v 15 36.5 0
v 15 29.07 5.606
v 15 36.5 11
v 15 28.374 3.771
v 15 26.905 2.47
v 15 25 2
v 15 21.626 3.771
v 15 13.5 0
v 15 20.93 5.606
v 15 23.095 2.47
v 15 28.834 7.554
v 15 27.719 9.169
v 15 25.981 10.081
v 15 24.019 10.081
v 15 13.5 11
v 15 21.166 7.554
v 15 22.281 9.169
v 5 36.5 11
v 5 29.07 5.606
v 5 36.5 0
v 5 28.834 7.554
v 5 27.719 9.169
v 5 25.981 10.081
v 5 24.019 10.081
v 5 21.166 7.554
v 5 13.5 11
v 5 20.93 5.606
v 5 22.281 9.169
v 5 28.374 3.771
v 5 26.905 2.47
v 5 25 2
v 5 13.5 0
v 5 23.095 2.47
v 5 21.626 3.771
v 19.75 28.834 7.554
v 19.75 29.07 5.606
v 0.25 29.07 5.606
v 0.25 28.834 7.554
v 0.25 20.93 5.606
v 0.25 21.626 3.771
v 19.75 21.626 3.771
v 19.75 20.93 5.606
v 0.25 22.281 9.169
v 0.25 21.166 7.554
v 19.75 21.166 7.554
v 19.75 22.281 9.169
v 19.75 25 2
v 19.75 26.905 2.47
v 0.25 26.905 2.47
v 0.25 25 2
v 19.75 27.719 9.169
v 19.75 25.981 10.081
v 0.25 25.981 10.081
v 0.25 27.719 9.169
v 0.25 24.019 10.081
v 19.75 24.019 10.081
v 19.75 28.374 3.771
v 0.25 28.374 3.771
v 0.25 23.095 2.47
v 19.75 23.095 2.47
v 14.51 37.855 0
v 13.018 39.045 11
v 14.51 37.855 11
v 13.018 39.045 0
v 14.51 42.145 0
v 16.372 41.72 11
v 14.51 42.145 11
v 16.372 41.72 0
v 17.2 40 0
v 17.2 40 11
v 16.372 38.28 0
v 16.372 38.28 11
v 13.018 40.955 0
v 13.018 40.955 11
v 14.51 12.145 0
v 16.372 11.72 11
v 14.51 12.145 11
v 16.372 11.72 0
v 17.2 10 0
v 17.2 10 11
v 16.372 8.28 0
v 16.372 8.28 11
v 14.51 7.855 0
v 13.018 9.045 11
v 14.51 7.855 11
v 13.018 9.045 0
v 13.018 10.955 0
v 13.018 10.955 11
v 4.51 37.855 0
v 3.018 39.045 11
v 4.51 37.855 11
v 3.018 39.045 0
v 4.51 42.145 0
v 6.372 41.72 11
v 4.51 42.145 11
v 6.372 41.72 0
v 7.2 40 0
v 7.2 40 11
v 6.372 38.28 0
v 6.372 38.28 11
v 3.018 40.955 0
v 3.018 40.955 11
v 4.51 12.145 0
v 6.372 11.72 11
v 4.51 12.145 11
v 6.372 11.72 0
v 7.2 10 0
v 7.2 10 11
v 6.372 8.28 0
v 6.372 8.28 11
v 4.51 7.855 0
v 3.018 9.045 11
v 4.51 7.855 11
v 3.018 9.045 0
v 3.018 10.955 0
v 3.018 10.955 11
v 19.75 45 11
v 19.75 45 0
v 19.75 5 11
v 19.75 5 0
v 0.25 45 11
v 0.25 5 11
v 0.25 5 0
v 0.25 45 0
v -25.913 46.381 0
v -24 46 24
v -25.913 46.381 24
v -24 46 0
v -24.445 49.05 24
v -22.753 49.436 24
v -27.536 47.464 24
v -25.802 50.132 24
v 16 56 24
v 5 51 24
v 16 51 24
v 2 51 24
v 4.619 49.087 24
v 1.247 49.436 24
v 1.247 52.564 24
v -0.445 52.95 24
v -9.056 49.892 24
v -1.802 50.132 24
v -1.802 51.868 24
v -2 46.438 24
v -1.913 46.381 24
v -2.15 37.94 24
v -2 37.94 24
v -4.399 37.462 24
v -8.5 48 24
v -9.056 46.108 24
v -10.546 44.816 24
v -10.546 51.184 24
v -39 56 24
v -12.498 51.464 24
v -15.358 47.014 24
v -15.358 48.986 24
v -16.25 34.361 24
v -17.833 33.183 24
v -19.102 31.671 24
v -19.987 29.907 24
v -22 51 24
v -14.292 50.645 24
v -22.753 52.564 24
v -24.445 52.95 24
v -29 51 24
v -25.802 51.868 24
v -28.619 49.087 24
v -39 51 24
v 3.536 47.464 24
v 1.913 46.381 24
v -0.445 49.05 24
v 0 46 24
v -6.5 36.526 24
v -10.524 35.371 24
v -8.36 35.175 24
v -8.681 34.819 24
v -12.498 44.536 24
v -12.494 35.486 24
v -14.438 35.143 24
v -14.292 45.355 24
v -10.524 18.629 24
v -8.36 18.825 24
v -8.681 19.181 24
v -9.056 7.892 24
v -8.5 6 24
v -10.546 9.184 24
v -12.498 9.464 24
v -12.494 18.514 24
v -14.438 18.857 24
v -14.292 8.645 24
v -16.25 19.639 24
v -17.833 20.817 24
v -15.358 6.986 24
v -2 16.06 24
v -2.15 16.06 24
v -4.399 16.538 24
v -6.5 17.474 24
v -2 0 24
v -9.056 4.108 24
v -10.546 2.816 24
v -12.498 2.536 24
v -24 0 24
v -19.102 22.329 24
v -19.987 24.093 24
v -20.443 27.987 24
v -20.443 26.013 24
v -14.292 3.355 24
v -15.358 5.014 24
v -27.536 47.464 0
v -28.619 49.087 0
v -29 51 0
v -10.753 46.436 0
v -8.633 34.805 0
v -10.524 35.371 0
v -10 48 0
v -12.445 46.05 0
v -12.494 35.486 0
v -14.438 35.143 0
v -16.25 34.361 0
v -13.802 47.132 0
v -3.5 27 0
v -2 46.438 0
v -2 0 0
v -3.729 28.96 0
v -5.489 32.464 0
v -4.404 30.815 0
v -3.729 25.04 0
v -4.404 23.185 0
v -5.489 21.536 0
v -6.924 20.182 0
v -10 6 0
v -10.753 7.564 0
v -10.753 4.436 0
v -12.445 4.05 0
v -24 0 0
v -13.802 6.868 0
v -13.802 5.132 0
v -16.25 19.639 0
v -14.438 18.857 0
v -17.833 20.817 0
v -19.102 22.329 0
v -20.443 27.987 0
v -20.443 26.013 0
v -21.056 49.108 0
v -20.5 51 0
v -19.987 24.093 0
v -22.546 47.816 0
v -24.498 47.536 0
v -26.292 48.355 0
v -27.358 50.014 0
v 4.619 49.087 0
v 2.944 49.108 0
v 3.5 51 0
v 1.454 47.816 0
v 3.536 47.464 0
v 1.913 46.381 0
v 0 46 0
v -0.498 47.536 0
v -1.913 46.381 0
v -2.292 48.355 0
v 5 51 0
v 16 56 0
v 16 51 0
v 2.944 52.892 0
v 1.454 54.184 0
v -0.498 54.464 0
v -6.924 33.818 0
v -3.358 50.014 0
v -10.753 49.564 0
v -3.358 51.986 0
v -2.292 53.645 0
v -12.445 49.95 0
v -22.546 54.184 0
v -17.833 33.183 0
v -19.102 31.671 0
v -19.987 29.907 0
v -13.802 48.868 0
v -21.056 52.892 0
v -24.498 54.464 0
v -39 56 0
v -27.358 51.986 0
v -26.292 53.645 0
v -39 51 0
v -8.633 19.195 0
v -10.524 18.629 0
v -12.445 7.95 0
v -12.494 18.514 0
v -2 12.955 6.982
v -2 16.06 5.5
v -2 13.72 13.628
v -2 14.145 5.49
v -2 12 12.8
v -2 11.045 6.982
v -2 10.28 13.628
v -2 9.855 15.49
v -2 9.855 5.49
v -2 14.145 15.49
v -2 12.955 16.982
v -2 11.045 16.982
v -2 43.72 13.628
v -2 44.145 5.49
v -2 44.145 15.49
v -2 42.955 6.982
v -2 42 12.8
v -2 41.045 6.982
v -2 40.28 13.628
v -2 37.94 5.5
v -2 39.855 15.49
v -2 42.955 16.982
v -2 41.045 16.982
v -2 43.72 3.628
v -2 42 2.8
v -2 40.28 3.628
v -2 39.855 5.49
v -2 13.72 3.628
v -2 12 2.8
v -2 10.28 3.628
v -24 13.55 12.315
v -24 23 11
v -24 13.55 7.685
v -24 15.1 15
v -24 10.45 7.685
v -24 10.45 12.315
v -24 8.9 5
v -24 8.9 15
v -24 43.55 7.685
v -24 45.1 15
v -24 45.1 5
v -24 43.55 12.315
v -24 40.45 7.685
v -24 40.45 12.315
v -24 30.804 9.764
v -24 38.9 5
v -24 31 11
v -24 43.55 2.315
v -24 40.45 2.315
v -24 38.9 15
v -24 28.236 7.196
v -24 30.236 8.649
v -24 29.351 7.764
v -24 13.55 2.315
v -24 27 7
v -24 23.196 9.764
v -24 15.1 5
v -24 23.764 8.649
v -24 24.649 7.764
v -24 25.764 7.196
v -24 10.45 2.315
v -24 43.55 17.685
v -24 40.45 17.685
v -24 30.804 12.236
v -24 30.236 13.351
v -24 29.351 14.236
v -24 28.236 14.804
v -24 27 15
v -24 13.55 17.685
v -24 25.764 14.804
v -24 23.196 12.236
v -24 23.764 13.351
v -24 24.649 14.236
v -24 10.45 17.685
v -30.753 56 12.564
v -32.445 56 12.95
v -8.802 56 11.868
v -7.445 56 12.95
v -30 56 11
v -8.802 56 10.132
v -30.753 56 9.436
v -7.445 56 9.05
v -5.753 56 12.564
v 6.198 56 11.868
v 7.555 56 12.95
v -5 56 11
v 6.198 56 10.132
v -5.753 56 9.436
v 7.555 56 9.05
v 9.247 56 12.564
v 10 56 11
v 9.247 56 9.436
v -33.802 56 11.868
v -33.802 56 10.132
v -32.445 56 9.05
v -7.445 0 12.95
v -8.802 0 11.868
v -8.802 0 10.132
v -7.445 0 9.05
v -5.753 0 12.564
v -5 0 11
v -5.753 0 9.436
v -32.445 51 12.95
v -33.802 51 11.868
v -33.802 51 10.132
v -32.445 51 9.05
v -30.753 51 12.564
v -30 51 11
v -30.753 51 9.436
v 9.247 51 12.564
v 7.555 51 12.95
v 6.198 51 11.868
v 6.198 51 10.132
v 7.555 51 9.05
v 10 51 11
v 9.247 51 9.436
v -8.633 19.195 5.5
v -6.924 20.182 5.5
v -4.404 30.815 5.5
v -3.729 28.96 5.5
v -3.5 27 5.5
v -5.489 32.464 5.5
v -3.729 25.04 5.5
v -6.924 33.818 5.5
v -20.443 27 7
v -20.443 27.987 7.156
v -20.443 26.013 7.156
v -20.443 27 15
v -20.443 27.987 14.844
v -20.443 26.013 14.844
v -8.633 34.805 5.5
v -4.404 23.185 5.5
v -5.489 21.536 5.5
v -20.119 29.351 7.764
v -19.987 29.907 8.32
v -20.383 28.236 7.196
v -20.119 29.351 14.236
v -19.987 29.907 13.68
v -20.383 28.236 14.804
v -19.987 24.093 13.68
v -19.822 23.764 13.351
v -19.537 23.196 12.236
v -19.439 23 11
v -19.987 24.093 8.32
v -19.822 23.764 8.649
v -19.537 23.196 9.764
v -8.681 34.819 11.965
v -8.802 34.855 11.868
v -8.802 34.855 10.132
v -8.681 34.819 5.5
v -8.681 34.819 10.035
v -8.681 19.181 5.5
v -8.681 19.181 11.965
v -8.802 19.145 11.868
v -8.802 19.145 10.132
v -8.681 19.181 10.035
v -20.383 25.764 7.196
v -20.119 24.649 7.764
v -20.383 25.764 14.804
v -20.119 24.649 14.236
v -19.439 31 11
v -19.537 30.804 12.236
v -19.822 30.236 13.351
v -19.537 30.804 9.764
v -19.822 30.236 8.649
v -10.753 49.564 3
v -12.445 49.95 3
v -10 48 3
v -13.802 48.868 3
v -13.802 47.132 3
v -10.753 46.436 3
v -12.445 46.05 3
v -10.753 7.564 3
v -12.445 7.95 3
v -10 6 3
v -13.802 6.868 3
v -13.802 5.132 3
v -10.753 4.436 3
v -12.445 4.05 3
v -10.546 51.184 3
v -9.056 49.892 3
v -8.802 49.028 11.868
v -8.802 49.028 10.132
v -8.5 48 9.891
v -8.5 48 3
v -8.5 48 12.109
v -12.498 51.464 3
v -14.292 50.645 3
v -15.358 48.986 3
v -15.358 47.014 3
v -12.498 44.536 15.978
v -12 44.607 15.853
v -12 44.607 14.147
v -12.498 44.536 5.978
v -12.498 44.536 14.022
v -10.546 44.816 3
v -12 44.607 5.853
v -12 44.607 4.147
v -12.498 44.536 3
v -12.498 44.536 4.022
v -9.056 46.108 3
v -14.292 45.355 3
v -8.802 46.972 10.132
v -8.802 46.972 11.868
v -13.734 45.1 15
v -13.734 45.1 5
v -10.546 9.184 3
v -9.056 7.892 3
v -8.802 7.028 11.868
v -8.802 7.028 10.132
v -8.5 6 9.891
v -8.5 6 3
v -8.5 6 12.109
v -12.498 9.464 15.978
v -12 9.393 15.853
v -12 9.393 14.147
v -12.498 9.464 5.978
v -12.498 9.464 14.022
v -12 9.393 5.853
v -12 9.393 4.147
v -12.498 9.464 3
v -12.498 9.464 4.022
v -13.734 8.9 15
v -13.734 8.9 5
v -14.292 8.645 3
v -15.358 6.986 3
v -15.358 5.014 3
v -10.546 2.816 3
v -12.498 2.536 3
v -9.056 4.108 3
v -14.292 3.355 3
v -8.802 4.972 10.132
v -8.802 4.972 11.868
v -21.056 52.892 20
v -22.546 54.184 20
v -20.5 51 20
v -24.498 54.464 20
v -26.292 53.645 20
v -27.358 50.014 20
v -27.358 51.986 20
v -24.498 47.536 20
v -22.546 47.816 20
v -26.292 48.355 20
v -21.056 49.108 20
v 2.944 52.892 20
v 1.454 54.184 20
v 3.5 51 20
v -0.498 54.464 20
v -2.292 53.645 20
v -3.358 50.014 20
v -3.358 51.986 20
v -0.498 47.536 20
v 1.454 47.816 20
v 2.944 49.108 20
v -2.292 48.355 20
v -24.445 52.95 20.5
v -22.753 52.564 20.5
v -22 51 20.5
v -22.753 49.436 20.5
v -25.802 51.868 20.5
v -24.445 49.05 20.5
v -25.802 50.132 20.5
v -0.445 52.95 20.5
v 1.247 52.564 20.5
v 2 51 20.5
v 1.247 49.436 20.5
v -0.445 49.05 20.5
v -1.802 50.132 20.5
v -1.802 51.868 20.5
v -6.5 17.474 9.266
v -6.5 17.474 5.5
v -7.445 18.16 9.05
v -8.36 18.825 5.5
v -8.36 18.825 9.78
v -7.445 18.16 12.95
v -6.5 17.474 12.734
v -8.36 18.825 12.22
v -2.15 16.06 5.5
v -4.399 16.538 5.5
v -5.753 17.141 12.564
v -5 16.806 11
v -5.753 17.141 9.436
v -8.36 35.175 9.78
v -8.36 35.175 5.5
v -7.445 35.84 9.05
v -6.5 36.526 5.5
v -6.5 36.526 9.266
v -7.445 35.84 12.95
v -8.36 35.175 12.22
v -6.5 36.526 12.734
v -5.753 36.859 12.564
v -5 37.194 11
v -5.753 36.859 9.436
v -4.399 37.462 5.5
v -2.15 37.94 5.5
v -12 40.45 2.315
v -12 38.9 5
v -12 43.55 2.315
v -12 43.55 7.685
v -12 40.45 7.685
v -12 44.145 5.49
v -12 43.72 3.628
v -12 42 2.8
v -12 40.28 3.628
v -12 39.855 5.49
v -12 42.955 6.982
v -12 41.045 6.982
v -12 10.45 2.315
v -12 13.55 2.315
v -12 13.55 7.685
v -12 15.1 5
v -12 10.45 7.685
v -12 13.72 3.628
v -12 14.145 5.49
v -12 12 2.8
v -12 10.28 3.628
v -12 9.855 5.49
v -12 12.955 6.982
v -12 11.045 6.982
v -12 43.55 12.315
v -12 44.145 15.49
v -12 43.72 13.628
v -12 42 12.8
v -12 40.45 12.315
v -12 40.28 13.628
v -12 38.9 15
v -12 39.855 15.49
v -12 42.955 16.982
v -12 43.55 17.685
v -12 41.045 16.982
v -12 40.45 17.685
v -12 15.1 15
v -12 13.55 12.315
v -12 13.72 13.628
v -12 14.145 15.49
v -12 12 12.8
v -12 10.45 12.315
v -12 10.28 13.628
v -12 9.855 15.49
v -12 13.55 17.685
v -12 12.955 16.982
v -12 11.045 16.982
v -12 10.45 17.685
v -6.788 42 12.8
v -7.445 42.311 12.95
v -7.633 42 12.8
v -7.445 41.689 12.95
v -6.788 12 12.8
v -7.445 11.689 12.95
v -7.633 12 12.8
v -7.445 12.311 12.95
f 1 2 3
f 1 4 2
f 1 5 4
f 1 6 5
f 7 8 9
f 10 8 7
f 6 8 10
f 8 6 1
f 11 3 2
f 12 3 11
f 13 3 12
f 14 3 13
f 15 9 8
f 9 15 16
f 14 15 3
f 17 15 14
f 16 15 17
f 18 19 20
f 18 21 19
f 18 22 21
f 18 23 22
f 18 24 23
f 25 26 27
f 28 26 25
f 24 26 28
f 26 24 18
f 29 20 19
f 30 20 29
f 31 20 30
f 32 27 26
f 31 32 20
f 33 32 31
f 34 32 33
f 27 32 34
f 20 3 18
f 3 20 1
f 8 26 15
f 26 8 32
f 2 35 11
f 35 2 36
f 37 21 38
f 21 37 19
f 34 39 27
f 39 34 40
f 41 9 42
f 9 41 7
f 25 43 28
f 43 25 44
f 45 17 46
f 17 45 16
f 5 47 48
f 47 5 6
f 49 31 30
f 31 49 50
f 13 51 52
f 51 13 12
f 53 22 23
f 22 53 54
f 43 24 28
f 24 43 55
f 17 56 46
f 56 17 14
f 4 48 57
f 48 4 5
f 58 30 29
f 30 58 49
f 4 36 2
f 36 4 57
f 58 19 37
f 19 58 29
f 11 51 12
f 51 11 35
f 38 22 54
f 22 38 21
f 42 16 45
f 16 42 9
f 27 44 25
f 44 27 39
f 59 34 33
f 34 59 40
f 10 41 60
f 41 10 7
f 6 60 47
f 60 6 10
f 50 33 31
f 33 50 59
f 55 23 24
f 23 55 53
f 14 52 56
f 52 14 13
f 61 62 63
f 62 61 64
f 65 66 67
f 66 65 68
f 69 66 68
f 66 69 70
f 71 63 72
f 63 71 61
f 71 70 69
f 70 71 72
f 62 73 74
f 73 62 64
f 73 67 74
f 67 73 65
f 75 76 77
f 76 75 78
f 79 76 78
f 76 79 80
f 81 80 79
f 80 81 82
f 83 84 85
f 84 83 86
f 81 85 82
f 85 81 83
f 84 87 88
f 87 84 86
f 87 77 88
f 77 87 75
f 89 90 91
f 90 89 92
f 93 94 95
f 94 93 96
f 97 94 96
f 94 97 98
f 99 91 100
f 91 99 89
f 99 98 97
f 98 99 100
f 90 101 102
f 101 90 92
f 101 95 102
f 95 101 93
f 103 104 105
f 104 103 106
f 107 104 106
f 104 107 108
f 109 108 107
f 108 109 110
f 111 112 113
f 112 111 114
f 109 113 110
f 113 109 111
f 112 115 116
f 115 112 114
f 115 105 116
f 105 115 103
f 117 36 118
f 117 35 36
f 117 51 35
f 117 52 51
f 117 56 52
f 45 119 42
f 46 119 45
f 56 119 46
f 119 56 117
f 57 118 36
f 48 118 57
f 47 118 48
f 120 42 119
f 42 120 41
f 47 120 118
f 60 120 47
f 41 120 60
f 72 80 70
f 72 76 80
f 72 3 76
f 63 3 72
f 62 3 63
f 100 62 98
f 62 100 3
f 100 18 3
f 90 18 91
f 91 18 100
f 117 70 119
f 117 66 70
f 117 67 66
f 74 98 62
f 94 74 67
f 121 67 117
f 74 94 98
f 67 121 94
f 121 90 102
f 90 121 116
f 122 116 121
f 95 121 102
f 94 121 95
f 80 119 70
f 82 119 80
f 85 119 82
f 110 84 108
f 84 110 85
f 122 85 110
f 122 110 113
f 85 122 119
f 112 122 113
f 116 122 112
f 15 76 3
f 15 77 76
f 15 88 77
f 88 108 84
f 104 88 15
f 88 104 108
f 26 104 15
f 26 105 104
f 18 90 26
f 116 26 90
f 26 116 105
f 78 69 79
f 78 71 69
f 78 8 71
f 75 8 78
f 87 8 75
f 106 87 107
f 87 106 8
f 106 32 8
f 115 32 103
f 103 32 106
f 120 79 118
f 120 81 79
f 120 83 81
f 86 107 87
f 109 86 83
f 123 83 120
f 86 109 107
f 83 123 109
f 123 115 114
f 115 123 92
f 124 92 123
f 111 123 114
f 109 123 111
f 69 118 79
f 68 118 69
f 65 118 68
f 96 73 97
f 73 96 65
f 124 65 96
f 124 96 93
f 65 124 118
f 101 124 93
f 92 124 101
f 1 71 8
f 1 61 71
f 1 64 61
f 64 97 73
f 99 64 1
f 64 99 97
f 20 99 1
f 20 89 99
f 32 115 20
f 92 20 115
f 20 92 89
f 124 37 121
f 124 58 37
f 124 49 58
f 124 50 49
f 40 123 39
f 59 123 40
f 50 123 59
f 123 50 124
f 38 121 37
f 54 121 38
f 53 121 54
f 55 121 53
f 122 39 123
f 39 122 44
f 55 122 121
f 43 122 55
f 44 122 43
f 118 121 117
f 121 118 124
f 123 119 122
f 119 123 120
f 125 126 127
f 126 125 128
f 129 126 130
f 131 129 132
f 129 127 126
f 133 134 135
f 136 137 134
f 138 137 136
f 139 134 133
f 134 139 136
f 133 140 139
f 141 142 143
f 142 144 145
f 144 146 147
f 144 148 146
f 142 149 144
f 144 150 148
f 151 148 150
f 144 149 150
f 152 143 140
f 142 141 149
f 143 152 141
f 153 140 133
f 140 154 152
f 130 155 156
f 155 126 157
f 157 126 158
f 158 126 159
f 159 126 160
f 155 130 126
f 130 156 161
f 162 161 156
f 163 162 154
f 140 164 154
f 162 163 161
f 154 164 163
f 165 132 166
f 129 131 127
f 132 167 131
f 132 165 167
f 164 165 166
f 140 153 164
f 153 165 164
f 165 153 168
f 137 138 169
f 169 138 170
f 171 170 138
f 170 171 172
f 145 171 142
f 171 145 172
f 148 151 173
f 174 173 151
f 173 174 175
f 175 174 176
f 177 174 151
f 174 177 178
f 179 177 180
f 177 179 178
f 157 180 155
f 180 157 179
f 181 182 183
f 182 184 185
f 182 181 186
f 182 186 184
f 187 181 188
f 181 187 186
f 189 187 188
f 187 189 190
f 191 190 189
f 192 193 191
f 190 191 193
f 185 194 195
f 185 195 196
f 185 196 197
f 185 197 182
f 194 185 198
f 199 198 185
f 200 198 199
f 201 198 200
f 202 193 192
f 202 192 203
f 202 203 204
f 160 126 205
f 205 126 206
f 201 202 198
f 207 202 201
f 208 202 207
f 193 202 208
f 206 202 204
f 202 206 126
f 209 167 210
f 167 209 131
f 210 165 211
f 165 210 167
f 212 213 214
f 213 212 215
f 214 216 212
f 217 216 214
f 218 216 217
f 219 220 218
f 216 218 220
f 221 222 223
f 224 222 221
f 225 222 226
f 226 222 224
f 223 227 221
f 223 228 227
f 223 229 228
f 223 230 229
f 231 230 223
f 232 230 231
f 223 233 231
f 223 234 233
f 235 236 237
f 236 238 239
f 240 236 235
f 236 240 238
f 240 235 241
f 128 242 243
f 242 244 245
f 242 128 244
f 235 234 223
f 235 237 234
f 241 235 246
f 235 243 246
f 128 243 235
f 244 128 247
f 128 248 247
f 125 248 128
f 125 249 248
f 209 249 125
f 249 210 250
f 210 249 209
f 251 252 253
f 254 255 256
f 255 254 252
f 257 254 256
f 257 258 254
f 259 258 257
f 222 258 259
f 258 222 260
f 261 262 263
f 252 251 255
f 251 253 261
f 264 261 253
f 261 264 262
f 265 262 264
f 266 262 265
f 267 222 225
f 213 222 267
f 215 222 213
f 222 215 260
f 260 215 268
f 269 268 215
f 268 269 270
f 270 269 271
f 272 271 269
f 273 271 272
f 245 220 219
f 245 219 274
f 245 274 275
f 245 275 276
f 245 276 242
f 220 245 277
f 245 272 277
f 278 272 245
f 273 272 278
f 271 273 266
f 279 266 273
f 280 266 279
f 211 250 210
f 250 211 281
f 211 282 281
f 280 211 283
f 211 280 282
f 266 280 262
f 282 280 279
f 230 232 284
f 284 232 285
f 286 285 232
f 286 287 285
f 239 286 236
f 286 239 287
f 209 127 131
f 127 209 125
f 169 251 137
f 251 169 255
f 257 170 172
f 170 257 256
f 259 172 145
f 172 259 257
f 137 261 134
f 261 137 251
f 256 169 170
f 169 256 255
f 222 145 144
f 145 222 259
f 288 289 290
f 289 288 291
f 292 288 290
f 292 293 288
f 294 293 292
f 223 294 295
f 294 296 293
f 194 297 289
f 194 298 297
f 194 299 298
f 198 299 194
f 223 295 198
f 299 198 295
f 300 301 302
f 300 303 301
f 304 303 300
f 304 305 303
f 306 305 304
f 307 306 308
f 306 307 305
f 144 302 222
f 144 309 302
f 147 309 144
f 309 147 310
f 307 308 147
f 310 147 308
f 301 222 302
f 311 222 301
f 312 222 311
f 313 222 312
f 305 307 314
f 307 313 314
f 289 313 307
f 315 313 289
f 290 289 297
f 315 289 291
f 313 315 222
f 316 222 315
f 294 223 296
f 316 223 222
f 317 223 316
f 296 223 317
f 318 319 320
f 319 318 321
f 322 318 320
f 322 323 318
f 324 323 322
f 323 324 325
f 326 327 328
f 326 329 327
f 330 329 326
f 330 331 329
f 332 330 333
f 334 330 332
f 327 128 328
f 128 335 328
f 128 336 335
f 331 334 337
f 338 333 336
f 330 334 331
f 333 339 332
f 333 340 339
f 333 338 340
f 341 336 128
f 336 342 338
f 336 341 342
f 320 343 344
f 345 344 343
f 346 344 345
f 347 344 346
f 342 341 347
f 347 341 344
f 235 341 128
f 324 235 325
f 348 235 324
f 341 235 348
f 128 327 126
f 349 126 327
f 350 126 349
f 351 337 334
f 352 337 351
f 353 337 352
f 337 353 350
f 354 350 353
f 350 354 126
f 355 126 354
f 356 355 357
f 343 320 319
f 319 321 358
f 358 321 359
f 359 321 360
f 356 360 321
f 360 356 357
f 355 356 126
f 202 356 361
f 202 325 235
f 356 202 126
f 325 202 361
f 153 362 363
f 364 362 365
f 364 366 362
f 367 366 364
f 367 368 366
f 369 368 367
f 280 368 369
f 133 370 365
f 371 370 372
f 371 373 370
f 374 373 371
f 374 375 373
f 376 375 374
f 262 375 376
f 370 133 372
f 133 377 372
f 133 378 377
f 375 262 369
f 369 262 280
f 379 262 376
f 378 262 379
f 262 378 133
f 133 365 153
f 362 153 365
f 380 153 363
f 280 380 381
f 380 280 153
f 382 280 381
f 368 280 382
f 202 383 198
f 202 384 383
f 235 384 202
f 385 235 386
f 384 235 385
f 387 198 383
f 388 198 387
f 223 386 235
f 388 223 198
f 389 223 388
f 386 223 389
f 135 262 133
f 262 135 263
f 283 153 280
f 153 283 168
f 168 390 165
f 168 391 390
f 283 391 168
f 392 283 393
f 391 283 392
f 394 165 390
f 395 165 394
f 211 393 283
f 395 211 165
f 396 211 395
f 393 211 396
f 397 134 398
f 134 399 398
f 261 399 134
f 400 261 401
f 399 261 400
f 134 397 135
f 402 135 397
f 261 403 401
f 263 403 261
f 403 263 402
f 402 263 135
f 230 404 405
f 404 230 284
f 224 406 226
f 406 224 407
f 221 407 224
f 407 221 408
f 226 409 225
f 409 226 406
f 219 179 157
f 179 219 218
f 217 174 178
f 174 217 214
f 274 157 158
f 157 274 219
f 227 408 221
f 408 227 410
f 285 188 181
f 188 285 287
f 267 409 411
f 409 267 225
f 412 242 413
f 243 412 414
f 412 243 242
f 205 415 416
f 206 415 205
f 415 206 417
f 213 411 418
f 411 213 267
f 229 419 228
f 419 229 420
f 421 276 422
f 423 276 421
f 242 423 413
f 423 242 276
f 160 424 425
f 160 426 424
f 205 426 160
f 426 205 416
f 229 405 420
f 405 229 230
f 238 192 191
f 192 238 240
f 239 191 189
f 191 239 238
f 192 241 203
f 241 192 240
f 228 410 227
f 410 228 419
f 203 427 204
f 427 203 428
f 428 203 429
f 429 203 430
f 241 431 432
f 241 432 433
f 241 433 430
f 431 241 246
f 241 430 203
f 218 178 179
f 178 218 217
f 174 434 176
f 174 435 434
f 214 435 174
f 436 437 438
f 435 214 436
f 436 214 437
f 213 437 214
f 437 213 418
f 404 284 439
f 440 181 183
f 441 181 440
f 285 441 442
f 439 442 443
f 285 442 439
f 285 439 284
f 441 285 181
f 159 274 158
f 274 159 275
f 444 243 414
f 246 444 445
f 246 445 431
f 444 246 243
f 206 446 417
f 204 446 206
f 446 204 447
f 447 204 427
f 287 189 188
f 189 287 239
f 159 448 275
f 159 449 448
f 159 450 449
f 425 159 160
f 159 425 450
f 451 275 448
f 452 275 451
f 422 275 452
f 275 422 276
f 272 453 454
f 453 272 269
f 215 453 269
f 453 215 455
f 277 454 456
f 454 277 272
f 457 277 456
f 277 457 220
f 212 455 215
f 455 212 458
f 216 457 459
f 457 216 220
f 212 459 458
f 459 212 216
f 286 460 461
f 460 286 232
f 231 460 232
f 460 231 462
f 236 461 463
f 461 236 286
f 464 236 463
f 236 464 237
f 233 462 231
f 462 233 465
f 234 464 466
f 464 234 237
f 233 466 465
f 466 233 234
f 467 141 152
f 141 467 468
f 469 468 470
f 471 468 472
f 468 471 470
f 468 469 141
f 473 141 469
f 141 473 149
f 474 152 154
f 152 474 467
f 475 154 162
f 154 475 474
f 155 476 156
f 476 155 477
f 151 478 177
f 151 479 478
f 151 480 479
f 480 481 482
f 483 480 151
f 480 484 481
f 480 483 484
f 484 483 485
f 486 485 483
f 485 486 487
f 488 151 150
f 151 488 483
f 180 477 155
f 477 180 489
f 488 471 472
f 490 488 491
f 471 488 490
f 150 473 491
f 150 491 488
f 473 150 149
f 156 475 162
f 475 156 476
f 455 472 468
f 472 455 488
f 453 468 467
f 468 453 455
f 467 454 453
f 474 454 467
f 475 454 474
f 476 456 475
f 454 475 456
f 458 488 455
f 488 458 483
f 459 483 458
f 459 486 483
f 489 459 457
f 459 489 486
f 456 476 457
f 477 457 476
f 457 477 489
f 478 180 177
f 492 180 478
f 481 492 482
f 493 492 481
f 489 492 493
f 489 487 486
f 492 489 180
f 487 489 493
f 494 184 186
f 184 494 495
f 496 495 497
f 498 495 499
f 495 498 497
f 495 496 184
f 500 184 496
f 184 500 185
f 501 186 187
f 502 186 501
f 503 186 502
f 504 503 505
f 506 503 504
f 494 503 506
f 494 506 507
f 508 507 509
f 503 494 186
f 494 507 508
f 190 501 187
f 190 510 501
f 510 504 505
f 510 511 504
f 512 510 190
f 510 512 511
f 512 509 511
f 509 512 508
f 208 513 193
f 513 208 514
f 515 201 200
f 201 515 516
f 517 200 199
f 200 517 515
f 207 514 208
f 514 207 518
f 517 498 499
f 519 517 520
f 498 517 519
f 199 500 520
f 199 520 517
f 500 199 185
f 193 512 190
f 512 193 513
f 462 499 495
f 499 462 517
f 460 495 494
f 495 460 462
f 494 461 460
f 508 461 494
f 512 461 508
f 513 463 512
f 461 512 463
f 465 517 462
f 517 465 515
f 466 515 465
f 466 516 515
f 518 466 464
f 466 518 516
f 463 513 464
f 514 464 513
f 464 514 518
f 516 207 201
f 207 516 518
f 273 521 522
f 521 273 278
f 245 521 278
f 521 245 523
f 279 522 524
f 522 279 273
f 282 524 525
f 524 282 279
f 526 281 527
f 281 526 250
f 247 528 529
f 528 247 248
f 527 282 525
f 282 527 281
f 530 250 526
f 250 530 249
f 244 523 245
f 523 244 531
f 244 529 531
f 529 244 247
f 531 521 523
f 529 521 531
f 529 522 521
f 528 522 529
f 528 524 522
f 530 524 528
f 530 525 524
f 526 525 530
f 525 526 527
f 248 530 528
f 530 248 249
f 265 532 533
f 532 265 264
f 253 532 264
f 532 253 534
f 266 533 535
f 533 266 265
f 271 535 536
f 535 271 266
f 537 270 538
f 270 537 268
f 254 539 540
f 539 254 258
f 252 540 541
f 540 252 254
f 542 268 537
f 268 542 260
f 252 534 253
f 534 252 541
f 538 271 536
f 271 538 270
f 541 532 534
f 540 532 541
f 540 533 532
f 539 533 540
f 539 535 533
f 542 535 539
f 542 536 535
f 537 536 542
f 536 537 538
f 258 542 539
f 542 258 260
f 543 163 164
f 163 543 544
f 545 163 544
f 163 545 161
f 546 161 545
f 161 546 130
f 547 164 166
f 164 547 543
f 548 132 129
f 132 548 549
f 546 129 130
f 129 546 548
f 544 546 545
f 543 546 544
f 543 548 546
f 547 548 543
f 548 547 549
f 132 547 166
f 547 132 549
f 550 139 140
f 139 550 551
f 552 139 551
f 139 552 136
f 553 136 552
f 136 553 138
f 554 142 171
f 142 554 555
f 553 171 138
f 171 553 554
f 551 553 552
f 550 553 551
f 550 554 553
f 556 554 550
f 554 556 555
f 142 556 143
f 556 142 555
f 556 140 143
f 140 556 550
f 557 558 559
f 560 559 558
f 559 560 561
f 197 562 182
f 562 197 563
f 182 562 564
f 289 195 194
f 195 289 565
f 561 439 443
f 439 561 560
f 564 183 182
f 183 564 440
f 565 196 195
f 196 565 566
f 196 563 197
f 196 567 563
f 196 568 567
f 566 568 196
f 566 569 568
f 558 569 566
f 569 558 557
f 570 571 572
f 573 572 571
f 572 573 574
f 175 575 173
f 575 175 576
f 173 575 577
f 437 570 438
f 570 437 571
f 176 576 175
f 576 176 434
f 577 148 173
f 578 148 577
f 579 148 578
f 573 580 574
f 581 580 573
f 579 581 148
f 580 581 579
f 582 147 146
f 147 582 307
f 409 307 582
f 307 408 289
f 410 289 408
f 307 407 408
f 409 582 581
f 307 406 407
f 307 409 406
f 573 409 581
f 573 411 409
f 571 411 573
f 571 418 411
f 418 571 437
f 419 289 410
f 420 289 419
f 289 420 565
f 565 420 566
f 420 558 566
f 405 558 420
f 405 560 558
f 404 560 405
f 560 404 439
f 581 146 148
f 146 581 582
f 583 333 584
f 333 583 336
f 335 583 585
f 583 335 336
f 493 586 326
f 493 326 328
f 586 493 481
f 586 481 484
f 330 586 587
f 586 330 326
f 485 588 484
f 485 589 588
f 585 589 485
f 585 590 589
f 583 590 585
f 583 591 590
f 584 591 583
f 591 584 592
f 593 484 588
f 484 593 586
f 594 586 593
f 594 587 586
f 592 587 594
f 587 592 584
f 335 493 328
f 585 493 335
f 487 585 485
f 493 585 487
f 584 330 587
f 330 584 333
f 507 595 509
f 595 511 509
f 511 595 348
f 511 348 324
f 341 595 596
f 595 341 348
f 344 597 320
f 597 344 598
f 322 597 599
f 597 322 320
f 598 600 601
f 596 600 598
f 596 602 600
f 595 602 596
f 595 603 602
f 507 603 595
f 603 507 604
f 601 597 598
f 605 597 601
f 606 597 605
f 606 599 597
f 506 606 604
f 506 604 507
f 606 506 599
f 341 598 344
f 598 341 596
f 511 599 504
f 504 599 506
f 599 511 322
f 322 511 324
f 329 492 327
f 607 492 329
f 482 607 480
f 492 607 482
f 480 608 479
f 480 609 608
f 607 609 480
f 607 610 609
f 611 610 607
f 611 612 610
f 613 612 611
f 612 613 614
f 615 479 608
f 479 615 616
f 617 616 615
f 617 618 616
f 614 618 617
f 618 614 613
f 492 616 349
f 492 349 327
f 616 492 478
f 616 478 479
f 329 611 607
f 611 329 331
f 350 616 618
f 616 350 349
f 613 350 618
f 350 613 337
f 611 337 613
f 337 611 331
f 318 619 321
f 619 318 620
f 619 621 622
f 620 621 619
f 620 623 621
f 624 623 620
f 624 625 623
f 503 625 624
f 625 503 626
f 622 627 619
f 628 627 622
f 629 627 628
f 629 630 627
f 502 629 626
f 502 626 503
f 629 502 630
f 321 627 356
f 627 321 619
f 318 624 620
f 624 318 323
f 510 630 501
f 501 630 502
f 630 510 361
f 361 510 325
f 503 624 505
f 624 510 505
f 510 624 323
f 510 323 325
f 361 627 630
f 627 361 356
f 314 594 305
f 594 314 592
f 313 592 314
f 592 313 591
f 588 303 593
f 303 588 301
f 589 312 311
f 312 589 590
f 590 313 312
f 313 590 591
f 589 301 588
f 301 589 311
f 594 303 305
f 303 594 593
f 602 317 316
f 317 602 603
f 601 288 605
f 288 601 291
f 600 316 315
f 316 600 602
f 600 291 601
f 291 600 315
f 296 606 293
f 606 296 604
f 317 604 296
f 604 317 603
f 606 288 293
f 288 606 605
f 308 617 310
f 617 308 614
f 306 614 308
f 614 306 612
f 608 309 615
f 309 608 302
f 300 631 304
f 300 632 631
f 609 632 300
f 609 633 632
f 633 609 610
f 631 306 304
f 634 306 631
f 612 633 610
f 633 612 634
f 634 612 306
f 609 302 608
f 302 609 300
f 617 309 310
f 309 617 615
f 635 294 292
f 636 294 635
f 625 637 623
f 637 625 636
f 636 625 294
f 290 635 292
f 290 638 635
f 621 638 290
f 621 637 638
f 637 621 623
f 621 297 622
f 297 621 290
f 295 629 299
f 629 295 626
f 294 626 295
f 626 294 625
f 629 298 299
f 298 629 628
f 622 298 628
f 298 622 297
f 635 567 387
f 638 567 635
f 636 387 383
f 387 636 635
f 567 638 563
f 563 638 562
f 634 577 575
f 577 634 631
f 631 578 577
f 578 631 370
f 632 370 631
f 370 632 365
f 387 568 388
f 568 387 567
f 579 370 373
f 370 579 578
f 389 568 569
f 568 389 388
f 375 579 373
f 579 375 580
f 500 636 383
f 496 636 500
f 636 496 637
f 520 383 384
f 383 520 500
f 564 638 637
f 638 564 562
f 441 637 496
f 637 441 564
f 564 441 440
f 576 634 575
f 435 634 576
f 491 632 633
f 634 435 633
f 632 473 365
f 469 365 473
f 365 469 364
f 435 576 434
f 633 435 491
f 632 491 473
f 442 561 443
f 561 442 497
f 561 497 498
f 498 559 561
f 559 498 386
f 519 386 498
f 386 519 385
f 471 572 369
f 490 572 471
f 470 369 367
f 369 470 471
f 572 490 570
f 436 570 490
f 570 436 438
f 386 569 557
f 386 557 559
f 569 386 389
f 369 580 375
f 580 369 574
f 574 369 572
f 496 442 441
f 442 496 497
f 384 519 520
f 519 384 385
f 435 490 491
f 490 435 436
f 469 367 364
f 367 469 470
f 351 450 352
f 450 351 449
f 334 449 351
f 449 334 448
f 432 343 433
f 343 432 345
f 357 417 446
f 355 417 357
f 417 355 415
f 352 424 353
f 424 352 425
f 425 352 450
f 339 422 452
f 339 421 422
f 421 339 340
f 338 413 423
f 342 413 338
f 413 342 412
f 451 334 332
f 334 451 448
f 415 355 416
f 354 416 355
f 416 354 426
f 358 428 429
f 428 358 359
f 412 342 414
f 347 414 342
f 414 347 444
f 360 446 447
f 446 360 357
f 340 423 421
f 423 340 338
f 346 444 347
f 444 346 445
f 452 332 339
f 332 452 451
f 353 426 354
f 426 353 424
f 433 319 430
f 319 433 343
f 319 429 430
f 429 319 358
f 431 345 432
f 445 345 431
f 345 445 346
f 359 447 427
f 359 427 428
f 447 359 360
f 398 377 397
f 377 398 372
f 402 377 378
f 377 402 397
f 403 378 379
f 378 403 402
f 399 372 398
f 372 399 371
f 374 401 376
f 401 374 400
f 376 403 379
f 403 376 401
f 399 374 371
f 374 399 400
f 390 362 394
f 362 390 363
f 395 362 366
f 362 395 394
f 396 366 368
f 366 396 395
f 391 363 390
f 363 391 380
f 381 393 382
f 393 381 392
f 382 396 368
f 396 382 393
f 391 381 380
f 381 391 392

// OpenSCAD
// PRUSA iteration3
// Compact extruder
// GNU GPL v3
// Josef Průša <iam@josefprusa.cz> and contributors
// http://www.reprap.org/wiki/Prusa_Mendel
// http://prusamendel.org


module extruder_base(){
 // Main body
 translate([-1,-2,0]) cube([22,56,24]);
 // Extruder plate mount
 translate([-16,49,0]) cube([55,5,24]);
 // Carriage mount cylinders
 translate([11,25,0]){
  translate([-12,24,0]) cylinder(r=5, h=24);
  translate([12,24,0]) cylinder(r=5, h=24);
 }
}

module extruder_holes(){
 translate([11,25,0]){ // Translate to center of the main block
  // Main shaft opening
  translate([0,0,-1]) cylinder(r=8.5, h=26);
  // Lower motor mount hole
  translate([0,21,-1]) cylinder(r=2, h=22);
  // Upper motor mount hole
  translate([0,-21,-1]) cylinder(r=2, h=22);
  // Lower motor mount hole screw head
  translate([0,21,3]) cylinder(r=3.5, h=22);
  // Upper motor mount hole screw head
  translate([0,-21,3]) cylinder(r=3.5, h=22);
  // Carriage mount right screw head hole
  translate([-12,24,-3]) cylinder(r=3.5, h=23);
  // Carriage mount left screw head hole
  translate([12,24,-3]) cylinder(r=3.5, h=23);
  // Carriage mount right screw hole
  translate([-12,24,20.5]) cylinder(r=2, h=23);
  // Carriage mount left screw head hole
  translate([12,24,20.5]) cylinder(r=2, h=23);
  // Idler bearing cutout
  translate([11,0,-4.5+10]) cylinder(r=11, h=20);
 }
 // Filament path
 translate([1.5+11+3.5,65,11]) rotate([90,0,0]) cylinder(r=2, h=70);
 // Hole for drive gear check
 translate([1.5+11+3.5-30,25,11]) rotate([90,0,90]) cylinder(r=4, h=70, $fn=20);
 // Left extruder plate mounting hole
 translate([1.5+11+3.5+15,65,11]) rotate([90,0,0]) cylinder(r=2, h=70);
 // Right extruder plate mounting hole
 translate([1.5+11+3.5-25,65,11]) rotate([90,0,0]) cylinder(r=2, h=70);
  // Idler mounting holse
  translate([11,25,10]){
   // Nut traps
   translate([-30,15,-5]) rotate([0,90,0]) rotate([0,0,30]) cylinder(r=3.1, h=30, $fn=6);
   translate([-30,-15,-5]) rotate([0,90,0]) rotate([0,0,30]) cylinder(r=3.1, h=30, $fn=6);
   translate([-30,15,5]) rotate([0,90,0]) rotate([0,0,30]) cylinder(r=3.1, h=30, $fn=6);
   translate([-30,-15,5]) rotate([0,90,0]) rotate([0,0,30]) cylinder(r=3.1, h=30, $fn=6);
   // Screws
   translate([-30,15,-5]) rotate([0,90,0]) cylinder(r=2.2, h=70);
   translate([-30,-15,-5]) rotate([0,90,0]) cylinder(r=2.2, h=70);
   translate([-30,15,5]) rotate([0,90,0]) cylinder(r=2.2, h=70);
   translate([-30,-15,5]) rotate([0,90,0]) cylinder(r=2.2, h=70);
	}
}

module extruder_idler_base(){
 translate([0.25,5,0]) cube([19.5,40,8+3]);
}

module extruder_idler_holes(){
 translate([10,25,0]){
  // Main cutout
  cube([10,23,25], center= true);
  // Idler shaft
  translate([-12,0,4.1+2])rotate([0,90,0])cylinder(r=4.1, h=24);
  // Screw holes
  translate([5,15,-1])cylinder(r=2.2, h=24);
  translate([5,-15,-1])cylinder(r=2.2, h=24);
  translate([-5,15,-1])cylinder(r=2.2, h=24);
  translate([-5,-15,-1])cylinder(r=2.2, h=24);
 }
}


// Idler final part
module idler(){
 difference(){
  extruder_idler_base();
  extruder_idler_holes();
 }
}

idler();

// Extruder final part
module extruder(){
 translate([-23,2,0])difference(){
  extruder_base();
  extruder_holes();
 }
}

extruder();
